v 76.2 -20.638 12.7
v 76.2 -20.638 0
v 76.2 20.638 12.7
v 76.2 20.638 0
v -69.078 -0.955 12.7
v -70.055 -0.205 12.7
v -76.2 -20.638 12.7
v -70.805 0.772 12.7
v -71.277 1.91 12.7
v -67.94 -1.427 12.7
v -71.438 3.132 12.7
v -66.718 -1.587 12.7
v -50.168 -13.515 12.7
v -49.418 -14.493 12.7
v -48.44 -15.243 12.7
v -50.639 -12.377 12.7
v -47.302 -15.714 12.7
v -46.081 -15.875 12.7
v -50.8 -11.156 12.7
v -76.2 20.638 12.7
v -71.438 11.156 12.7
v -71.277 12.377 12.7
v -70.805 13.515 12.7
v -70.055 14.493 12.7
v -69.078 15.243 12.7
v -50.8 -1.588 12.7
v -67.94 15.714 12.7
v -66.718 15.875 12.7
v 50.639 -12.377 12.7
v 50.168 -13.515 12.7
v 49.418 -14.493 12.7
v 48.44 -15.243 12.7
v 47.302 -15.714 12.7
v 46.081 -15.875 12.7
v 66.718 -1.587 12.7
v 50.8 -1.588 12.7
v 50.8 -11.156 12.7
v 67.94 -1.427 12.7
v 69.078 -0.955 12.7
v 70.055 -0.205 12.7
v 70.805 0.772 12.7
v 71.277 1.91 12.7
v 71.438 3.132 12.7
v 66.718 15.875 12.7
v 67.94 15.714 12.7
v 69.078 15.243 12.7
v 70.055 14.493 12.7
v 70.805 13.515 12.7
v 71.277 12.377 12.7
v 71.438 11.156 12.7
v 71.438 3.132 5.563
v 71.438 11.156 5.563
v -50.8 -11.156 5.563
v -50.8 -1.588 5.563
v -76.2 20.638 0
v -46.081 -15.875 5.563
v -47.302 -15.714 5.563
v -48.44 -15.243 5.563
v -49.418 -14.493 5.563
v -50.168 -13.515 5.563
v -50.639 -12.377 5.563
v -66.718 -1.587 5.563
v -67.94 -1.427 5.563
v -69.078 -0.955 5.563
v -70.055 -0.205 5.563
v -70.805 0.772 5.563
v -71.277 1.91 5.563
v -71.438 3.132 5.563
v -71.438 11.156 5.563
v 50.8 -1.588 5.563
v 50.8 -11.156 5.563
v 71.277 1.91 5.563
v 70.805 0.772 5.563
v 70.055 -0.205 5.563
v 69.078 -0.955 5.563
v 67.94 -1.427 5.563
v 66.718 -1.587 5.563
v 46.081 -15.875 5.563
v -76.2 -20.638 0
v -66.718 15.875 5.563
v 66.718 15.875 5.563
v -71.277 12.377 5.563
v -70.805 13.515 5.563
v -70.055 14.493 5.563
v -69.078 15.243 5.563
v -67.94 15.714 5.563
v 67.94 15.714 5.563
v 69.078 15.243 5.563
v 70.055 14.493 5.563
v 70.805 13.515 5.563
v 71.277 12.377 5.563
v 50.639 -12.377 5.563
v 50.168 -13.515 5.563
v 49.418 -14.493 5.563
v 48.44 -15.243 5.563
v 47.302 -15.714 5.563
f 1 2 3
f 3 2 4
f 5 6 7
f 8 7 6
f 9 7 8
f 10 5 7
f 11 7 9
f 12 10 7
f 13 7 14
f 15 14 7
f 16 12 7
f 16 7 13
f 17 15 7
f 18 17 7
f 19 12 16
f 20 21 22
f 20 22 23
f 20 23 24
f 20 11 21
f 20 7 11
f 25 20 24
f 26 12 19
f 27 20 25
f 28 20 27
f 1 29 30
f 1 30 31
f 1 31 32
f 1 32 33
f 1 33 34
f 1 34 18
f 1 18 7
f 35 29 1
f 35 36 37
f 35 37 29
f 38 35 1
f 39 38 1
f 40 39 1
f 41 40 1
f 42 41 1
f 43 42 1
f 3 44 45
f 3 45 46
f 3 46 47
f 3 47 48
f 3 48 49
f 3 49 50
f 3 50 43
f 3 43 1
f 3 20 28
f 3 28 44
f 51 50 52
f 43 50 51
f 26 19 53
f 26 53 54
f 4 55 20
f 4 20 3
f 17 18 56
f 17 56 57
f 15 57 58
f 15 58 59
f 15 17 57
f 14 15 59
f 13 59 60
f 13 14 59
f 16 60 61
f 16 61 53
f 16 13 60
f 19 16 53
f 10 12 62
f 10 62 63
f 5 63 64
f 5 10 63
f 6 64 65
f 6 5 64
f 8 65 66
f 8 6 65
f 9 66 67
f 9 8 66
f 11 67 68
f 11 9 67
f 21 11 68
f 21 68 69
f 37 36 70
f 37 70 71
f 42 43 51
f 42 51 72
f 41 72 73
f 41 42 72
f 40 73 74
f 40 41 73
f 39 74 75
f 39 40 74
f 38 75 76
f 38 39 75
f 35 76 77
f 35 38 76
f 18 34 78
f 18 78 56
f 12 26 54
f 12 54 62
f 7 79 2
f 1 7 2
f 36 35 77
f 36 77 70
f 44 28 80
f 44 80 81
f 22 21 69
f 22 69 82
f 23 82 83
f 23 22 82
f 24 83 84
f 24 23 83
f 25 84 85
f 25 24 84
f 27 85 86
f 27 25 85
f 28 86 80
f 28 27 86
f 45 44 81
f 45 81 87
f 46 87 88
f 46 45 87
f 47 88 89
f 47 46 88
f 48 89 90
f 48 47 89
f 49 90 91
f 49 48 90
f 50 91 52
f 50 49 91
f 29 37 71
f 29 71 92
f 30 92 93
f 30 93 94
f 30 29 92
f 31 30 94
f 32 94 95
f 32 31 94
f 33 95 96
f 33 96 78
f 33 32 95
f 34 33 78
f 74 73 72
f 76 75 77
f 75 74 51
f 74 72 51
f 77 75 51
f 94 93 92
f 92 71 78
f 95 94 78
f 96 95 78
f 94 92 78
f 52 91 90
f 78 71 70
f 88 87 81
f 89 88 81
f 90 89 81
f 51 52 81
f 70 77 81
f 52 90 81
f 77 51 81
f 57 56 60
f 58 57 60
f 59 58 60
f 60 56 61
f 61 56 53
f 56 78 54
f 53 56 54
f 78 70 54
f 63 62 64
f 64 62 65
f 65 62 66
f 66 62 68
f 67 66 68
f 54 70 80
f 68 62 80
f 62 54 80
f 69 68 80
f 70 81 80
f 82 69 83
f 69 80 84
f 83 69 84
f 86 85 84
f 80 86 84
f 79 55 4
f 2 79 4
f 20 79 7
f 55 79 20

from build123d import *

# Parameters (mm, degrees)
SKETCH1_W           = 152.4
SKETCH1_H           = 41.275
BOSS_EXTRUDE1_DEPTH = 12.7
CUT_EXTRUDE1_DEPTH  = 7.1374


with BuildPart() as part:
    # Sketch1 → Boss-Extrude1 (new body)
    with BuildSketch(Plane.XY):
        Rectangle(SKETCH1_W, SKETCH1_H)
    extrude(amount=BOSS_EXTRUDE1_DEPTH)

    # Sketch2 → Cut-Extrude1 (cut)
    with BuildSketch(Plane.XY.offset(12.7)):
        with BuildLine():
            Line((-66.718427065, 15.875), (66.718427065, 15.875))
            ThreePointArc((66.718427065, 15.875), (70.055315538, 14.492815538), (71.4375, 11.155927065))
            Line((71.4375, 11.155927065), (71.4375, 3.131572935))
            ThreePointArc((71.4375, 3.131572935), (70.055315538, -0.205315538), (66.718427065, -1.5875))
            Line((66.718427065, -1.5875), (50.8, -1.5875))
            Line((50.8, -1.5875), (50.8, -11.155927065))
            ThreePointArc((50.8, -11.155927065), (49.417815538, -14.492815538), (46.080927065, -15.875))
            Line((46.080927065, -15.875), (-46.080927065, -15.875))
            ThreePointArc((-46.080927065, -15.875), (-49.417815538, -14.492815538), (-50.8, -11.155927065))
            Line((-50.8, -11.155927065), (-50.8, -1.5875))
            Line((-50.8, -1.5875), (-66.718427065, -1.5875))
            ThreePointArc((-66.718427065, -1.5875), (-70.055315538, -0.205315538), (-71.4375, 3.131572935))
            Line((-71.4375, 3.131572935), (-71.4375, 11.155927065))
            ThreePointArc((-71.4375, 11.155927065), (-70.055315538, 14.492815538), (-66.718427065, 15.875))
        make_face()
    extrude(amount=-CUT_EXTRUDE1_DEPTH, mode=Mode.SUBTRACT)


solid = part.part
